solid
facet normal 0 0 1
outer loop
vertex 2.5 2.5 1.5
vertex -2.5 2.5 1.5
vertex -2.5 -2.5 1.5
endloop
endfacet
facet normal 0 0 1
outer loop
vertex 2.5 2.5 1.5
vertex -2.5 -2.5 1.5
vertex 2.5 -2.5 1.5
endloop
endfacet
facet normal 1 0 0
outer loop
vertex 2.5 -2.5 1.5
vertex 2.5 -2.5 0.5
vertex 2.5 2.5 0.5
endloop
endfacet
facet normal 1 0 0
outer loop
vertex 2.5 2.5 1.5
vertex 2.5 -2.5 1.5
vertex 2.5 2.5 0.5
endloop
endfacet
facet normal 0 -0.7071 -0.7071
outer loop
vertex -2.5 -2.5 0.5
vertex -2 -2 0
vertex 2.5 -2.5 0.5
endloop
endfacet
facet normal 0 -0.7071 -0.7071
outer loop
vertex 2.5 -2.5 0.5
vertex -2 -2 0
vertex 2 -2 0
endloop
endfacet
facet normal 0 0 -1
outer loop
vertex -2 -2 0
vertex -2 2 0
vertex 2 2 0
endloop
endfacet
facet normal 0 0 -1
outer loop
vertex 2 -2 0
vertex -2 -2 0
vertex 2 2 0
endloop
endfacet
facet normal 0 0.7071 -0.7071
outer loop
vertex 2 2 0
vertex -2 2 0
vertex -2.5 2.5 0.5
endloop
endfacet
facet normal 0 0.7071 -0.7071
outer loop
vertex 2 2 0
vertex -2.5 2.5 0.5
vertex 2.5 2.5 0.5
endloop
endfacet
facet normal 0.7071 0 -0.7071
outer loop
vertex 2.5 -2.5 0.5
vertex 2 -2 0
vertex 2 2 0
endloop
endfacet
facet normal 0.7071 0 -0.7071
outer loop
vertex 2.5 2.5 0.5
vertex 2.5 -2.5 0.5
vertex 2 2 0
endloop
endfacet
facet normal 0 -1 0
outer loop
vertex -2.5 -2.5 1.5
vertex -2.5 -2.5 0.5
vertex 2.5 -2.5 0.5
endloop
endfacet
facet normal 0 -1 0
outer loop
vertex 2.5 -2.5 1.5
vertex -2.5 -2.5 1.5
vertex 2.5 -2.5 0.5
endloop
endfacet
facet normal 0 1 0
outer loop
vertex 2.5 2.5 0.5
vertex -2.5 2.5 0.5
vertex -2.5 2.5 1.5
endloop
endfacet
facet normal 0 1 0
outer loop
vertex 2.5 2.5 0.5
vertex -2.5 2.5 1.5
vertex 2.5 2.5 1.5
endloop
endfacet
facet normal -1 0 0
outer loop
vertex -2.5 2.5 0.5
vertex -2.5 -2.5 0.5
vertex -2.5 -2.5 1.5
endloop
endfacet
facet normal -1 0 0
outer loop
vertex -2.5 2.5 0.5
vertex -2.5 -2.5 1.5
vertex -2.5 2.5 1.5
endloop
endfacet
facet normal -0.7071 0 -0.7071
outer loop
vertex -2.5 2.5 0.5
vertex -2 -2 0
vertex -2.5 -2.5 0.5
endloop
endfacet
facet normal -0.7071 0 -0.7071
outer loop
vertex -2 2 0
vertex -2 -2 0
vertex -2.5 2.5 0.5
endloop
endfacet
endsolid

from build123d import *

# Parameters (mm, degrees)
SKETCH_W     = 5
SKETCH_H     = 5
PAD_DEPTH    = 1.5
CHAMFER_SIZE = 0.5


with BuildPart() as part:
    # Sketch → Pad (new body)
    with BuildSketch(Plane.XY):
        Rectangle(SKETCH_W, SKETCH_H)
    extrude(amount=PAD_DEPTH)

    # Chamfer
    chamfer_edges = [part.edges().sort_by_distance(p)[0] for p in [
        (-2.5, 0, 0),
        (0, -2.5, 0),
        (2.5, 0, 0),
        (0, 2.5, 0),
    ]]
    chamfer(chamfer_edges, length=CHAMFER_SIZE)


solid = part.part
